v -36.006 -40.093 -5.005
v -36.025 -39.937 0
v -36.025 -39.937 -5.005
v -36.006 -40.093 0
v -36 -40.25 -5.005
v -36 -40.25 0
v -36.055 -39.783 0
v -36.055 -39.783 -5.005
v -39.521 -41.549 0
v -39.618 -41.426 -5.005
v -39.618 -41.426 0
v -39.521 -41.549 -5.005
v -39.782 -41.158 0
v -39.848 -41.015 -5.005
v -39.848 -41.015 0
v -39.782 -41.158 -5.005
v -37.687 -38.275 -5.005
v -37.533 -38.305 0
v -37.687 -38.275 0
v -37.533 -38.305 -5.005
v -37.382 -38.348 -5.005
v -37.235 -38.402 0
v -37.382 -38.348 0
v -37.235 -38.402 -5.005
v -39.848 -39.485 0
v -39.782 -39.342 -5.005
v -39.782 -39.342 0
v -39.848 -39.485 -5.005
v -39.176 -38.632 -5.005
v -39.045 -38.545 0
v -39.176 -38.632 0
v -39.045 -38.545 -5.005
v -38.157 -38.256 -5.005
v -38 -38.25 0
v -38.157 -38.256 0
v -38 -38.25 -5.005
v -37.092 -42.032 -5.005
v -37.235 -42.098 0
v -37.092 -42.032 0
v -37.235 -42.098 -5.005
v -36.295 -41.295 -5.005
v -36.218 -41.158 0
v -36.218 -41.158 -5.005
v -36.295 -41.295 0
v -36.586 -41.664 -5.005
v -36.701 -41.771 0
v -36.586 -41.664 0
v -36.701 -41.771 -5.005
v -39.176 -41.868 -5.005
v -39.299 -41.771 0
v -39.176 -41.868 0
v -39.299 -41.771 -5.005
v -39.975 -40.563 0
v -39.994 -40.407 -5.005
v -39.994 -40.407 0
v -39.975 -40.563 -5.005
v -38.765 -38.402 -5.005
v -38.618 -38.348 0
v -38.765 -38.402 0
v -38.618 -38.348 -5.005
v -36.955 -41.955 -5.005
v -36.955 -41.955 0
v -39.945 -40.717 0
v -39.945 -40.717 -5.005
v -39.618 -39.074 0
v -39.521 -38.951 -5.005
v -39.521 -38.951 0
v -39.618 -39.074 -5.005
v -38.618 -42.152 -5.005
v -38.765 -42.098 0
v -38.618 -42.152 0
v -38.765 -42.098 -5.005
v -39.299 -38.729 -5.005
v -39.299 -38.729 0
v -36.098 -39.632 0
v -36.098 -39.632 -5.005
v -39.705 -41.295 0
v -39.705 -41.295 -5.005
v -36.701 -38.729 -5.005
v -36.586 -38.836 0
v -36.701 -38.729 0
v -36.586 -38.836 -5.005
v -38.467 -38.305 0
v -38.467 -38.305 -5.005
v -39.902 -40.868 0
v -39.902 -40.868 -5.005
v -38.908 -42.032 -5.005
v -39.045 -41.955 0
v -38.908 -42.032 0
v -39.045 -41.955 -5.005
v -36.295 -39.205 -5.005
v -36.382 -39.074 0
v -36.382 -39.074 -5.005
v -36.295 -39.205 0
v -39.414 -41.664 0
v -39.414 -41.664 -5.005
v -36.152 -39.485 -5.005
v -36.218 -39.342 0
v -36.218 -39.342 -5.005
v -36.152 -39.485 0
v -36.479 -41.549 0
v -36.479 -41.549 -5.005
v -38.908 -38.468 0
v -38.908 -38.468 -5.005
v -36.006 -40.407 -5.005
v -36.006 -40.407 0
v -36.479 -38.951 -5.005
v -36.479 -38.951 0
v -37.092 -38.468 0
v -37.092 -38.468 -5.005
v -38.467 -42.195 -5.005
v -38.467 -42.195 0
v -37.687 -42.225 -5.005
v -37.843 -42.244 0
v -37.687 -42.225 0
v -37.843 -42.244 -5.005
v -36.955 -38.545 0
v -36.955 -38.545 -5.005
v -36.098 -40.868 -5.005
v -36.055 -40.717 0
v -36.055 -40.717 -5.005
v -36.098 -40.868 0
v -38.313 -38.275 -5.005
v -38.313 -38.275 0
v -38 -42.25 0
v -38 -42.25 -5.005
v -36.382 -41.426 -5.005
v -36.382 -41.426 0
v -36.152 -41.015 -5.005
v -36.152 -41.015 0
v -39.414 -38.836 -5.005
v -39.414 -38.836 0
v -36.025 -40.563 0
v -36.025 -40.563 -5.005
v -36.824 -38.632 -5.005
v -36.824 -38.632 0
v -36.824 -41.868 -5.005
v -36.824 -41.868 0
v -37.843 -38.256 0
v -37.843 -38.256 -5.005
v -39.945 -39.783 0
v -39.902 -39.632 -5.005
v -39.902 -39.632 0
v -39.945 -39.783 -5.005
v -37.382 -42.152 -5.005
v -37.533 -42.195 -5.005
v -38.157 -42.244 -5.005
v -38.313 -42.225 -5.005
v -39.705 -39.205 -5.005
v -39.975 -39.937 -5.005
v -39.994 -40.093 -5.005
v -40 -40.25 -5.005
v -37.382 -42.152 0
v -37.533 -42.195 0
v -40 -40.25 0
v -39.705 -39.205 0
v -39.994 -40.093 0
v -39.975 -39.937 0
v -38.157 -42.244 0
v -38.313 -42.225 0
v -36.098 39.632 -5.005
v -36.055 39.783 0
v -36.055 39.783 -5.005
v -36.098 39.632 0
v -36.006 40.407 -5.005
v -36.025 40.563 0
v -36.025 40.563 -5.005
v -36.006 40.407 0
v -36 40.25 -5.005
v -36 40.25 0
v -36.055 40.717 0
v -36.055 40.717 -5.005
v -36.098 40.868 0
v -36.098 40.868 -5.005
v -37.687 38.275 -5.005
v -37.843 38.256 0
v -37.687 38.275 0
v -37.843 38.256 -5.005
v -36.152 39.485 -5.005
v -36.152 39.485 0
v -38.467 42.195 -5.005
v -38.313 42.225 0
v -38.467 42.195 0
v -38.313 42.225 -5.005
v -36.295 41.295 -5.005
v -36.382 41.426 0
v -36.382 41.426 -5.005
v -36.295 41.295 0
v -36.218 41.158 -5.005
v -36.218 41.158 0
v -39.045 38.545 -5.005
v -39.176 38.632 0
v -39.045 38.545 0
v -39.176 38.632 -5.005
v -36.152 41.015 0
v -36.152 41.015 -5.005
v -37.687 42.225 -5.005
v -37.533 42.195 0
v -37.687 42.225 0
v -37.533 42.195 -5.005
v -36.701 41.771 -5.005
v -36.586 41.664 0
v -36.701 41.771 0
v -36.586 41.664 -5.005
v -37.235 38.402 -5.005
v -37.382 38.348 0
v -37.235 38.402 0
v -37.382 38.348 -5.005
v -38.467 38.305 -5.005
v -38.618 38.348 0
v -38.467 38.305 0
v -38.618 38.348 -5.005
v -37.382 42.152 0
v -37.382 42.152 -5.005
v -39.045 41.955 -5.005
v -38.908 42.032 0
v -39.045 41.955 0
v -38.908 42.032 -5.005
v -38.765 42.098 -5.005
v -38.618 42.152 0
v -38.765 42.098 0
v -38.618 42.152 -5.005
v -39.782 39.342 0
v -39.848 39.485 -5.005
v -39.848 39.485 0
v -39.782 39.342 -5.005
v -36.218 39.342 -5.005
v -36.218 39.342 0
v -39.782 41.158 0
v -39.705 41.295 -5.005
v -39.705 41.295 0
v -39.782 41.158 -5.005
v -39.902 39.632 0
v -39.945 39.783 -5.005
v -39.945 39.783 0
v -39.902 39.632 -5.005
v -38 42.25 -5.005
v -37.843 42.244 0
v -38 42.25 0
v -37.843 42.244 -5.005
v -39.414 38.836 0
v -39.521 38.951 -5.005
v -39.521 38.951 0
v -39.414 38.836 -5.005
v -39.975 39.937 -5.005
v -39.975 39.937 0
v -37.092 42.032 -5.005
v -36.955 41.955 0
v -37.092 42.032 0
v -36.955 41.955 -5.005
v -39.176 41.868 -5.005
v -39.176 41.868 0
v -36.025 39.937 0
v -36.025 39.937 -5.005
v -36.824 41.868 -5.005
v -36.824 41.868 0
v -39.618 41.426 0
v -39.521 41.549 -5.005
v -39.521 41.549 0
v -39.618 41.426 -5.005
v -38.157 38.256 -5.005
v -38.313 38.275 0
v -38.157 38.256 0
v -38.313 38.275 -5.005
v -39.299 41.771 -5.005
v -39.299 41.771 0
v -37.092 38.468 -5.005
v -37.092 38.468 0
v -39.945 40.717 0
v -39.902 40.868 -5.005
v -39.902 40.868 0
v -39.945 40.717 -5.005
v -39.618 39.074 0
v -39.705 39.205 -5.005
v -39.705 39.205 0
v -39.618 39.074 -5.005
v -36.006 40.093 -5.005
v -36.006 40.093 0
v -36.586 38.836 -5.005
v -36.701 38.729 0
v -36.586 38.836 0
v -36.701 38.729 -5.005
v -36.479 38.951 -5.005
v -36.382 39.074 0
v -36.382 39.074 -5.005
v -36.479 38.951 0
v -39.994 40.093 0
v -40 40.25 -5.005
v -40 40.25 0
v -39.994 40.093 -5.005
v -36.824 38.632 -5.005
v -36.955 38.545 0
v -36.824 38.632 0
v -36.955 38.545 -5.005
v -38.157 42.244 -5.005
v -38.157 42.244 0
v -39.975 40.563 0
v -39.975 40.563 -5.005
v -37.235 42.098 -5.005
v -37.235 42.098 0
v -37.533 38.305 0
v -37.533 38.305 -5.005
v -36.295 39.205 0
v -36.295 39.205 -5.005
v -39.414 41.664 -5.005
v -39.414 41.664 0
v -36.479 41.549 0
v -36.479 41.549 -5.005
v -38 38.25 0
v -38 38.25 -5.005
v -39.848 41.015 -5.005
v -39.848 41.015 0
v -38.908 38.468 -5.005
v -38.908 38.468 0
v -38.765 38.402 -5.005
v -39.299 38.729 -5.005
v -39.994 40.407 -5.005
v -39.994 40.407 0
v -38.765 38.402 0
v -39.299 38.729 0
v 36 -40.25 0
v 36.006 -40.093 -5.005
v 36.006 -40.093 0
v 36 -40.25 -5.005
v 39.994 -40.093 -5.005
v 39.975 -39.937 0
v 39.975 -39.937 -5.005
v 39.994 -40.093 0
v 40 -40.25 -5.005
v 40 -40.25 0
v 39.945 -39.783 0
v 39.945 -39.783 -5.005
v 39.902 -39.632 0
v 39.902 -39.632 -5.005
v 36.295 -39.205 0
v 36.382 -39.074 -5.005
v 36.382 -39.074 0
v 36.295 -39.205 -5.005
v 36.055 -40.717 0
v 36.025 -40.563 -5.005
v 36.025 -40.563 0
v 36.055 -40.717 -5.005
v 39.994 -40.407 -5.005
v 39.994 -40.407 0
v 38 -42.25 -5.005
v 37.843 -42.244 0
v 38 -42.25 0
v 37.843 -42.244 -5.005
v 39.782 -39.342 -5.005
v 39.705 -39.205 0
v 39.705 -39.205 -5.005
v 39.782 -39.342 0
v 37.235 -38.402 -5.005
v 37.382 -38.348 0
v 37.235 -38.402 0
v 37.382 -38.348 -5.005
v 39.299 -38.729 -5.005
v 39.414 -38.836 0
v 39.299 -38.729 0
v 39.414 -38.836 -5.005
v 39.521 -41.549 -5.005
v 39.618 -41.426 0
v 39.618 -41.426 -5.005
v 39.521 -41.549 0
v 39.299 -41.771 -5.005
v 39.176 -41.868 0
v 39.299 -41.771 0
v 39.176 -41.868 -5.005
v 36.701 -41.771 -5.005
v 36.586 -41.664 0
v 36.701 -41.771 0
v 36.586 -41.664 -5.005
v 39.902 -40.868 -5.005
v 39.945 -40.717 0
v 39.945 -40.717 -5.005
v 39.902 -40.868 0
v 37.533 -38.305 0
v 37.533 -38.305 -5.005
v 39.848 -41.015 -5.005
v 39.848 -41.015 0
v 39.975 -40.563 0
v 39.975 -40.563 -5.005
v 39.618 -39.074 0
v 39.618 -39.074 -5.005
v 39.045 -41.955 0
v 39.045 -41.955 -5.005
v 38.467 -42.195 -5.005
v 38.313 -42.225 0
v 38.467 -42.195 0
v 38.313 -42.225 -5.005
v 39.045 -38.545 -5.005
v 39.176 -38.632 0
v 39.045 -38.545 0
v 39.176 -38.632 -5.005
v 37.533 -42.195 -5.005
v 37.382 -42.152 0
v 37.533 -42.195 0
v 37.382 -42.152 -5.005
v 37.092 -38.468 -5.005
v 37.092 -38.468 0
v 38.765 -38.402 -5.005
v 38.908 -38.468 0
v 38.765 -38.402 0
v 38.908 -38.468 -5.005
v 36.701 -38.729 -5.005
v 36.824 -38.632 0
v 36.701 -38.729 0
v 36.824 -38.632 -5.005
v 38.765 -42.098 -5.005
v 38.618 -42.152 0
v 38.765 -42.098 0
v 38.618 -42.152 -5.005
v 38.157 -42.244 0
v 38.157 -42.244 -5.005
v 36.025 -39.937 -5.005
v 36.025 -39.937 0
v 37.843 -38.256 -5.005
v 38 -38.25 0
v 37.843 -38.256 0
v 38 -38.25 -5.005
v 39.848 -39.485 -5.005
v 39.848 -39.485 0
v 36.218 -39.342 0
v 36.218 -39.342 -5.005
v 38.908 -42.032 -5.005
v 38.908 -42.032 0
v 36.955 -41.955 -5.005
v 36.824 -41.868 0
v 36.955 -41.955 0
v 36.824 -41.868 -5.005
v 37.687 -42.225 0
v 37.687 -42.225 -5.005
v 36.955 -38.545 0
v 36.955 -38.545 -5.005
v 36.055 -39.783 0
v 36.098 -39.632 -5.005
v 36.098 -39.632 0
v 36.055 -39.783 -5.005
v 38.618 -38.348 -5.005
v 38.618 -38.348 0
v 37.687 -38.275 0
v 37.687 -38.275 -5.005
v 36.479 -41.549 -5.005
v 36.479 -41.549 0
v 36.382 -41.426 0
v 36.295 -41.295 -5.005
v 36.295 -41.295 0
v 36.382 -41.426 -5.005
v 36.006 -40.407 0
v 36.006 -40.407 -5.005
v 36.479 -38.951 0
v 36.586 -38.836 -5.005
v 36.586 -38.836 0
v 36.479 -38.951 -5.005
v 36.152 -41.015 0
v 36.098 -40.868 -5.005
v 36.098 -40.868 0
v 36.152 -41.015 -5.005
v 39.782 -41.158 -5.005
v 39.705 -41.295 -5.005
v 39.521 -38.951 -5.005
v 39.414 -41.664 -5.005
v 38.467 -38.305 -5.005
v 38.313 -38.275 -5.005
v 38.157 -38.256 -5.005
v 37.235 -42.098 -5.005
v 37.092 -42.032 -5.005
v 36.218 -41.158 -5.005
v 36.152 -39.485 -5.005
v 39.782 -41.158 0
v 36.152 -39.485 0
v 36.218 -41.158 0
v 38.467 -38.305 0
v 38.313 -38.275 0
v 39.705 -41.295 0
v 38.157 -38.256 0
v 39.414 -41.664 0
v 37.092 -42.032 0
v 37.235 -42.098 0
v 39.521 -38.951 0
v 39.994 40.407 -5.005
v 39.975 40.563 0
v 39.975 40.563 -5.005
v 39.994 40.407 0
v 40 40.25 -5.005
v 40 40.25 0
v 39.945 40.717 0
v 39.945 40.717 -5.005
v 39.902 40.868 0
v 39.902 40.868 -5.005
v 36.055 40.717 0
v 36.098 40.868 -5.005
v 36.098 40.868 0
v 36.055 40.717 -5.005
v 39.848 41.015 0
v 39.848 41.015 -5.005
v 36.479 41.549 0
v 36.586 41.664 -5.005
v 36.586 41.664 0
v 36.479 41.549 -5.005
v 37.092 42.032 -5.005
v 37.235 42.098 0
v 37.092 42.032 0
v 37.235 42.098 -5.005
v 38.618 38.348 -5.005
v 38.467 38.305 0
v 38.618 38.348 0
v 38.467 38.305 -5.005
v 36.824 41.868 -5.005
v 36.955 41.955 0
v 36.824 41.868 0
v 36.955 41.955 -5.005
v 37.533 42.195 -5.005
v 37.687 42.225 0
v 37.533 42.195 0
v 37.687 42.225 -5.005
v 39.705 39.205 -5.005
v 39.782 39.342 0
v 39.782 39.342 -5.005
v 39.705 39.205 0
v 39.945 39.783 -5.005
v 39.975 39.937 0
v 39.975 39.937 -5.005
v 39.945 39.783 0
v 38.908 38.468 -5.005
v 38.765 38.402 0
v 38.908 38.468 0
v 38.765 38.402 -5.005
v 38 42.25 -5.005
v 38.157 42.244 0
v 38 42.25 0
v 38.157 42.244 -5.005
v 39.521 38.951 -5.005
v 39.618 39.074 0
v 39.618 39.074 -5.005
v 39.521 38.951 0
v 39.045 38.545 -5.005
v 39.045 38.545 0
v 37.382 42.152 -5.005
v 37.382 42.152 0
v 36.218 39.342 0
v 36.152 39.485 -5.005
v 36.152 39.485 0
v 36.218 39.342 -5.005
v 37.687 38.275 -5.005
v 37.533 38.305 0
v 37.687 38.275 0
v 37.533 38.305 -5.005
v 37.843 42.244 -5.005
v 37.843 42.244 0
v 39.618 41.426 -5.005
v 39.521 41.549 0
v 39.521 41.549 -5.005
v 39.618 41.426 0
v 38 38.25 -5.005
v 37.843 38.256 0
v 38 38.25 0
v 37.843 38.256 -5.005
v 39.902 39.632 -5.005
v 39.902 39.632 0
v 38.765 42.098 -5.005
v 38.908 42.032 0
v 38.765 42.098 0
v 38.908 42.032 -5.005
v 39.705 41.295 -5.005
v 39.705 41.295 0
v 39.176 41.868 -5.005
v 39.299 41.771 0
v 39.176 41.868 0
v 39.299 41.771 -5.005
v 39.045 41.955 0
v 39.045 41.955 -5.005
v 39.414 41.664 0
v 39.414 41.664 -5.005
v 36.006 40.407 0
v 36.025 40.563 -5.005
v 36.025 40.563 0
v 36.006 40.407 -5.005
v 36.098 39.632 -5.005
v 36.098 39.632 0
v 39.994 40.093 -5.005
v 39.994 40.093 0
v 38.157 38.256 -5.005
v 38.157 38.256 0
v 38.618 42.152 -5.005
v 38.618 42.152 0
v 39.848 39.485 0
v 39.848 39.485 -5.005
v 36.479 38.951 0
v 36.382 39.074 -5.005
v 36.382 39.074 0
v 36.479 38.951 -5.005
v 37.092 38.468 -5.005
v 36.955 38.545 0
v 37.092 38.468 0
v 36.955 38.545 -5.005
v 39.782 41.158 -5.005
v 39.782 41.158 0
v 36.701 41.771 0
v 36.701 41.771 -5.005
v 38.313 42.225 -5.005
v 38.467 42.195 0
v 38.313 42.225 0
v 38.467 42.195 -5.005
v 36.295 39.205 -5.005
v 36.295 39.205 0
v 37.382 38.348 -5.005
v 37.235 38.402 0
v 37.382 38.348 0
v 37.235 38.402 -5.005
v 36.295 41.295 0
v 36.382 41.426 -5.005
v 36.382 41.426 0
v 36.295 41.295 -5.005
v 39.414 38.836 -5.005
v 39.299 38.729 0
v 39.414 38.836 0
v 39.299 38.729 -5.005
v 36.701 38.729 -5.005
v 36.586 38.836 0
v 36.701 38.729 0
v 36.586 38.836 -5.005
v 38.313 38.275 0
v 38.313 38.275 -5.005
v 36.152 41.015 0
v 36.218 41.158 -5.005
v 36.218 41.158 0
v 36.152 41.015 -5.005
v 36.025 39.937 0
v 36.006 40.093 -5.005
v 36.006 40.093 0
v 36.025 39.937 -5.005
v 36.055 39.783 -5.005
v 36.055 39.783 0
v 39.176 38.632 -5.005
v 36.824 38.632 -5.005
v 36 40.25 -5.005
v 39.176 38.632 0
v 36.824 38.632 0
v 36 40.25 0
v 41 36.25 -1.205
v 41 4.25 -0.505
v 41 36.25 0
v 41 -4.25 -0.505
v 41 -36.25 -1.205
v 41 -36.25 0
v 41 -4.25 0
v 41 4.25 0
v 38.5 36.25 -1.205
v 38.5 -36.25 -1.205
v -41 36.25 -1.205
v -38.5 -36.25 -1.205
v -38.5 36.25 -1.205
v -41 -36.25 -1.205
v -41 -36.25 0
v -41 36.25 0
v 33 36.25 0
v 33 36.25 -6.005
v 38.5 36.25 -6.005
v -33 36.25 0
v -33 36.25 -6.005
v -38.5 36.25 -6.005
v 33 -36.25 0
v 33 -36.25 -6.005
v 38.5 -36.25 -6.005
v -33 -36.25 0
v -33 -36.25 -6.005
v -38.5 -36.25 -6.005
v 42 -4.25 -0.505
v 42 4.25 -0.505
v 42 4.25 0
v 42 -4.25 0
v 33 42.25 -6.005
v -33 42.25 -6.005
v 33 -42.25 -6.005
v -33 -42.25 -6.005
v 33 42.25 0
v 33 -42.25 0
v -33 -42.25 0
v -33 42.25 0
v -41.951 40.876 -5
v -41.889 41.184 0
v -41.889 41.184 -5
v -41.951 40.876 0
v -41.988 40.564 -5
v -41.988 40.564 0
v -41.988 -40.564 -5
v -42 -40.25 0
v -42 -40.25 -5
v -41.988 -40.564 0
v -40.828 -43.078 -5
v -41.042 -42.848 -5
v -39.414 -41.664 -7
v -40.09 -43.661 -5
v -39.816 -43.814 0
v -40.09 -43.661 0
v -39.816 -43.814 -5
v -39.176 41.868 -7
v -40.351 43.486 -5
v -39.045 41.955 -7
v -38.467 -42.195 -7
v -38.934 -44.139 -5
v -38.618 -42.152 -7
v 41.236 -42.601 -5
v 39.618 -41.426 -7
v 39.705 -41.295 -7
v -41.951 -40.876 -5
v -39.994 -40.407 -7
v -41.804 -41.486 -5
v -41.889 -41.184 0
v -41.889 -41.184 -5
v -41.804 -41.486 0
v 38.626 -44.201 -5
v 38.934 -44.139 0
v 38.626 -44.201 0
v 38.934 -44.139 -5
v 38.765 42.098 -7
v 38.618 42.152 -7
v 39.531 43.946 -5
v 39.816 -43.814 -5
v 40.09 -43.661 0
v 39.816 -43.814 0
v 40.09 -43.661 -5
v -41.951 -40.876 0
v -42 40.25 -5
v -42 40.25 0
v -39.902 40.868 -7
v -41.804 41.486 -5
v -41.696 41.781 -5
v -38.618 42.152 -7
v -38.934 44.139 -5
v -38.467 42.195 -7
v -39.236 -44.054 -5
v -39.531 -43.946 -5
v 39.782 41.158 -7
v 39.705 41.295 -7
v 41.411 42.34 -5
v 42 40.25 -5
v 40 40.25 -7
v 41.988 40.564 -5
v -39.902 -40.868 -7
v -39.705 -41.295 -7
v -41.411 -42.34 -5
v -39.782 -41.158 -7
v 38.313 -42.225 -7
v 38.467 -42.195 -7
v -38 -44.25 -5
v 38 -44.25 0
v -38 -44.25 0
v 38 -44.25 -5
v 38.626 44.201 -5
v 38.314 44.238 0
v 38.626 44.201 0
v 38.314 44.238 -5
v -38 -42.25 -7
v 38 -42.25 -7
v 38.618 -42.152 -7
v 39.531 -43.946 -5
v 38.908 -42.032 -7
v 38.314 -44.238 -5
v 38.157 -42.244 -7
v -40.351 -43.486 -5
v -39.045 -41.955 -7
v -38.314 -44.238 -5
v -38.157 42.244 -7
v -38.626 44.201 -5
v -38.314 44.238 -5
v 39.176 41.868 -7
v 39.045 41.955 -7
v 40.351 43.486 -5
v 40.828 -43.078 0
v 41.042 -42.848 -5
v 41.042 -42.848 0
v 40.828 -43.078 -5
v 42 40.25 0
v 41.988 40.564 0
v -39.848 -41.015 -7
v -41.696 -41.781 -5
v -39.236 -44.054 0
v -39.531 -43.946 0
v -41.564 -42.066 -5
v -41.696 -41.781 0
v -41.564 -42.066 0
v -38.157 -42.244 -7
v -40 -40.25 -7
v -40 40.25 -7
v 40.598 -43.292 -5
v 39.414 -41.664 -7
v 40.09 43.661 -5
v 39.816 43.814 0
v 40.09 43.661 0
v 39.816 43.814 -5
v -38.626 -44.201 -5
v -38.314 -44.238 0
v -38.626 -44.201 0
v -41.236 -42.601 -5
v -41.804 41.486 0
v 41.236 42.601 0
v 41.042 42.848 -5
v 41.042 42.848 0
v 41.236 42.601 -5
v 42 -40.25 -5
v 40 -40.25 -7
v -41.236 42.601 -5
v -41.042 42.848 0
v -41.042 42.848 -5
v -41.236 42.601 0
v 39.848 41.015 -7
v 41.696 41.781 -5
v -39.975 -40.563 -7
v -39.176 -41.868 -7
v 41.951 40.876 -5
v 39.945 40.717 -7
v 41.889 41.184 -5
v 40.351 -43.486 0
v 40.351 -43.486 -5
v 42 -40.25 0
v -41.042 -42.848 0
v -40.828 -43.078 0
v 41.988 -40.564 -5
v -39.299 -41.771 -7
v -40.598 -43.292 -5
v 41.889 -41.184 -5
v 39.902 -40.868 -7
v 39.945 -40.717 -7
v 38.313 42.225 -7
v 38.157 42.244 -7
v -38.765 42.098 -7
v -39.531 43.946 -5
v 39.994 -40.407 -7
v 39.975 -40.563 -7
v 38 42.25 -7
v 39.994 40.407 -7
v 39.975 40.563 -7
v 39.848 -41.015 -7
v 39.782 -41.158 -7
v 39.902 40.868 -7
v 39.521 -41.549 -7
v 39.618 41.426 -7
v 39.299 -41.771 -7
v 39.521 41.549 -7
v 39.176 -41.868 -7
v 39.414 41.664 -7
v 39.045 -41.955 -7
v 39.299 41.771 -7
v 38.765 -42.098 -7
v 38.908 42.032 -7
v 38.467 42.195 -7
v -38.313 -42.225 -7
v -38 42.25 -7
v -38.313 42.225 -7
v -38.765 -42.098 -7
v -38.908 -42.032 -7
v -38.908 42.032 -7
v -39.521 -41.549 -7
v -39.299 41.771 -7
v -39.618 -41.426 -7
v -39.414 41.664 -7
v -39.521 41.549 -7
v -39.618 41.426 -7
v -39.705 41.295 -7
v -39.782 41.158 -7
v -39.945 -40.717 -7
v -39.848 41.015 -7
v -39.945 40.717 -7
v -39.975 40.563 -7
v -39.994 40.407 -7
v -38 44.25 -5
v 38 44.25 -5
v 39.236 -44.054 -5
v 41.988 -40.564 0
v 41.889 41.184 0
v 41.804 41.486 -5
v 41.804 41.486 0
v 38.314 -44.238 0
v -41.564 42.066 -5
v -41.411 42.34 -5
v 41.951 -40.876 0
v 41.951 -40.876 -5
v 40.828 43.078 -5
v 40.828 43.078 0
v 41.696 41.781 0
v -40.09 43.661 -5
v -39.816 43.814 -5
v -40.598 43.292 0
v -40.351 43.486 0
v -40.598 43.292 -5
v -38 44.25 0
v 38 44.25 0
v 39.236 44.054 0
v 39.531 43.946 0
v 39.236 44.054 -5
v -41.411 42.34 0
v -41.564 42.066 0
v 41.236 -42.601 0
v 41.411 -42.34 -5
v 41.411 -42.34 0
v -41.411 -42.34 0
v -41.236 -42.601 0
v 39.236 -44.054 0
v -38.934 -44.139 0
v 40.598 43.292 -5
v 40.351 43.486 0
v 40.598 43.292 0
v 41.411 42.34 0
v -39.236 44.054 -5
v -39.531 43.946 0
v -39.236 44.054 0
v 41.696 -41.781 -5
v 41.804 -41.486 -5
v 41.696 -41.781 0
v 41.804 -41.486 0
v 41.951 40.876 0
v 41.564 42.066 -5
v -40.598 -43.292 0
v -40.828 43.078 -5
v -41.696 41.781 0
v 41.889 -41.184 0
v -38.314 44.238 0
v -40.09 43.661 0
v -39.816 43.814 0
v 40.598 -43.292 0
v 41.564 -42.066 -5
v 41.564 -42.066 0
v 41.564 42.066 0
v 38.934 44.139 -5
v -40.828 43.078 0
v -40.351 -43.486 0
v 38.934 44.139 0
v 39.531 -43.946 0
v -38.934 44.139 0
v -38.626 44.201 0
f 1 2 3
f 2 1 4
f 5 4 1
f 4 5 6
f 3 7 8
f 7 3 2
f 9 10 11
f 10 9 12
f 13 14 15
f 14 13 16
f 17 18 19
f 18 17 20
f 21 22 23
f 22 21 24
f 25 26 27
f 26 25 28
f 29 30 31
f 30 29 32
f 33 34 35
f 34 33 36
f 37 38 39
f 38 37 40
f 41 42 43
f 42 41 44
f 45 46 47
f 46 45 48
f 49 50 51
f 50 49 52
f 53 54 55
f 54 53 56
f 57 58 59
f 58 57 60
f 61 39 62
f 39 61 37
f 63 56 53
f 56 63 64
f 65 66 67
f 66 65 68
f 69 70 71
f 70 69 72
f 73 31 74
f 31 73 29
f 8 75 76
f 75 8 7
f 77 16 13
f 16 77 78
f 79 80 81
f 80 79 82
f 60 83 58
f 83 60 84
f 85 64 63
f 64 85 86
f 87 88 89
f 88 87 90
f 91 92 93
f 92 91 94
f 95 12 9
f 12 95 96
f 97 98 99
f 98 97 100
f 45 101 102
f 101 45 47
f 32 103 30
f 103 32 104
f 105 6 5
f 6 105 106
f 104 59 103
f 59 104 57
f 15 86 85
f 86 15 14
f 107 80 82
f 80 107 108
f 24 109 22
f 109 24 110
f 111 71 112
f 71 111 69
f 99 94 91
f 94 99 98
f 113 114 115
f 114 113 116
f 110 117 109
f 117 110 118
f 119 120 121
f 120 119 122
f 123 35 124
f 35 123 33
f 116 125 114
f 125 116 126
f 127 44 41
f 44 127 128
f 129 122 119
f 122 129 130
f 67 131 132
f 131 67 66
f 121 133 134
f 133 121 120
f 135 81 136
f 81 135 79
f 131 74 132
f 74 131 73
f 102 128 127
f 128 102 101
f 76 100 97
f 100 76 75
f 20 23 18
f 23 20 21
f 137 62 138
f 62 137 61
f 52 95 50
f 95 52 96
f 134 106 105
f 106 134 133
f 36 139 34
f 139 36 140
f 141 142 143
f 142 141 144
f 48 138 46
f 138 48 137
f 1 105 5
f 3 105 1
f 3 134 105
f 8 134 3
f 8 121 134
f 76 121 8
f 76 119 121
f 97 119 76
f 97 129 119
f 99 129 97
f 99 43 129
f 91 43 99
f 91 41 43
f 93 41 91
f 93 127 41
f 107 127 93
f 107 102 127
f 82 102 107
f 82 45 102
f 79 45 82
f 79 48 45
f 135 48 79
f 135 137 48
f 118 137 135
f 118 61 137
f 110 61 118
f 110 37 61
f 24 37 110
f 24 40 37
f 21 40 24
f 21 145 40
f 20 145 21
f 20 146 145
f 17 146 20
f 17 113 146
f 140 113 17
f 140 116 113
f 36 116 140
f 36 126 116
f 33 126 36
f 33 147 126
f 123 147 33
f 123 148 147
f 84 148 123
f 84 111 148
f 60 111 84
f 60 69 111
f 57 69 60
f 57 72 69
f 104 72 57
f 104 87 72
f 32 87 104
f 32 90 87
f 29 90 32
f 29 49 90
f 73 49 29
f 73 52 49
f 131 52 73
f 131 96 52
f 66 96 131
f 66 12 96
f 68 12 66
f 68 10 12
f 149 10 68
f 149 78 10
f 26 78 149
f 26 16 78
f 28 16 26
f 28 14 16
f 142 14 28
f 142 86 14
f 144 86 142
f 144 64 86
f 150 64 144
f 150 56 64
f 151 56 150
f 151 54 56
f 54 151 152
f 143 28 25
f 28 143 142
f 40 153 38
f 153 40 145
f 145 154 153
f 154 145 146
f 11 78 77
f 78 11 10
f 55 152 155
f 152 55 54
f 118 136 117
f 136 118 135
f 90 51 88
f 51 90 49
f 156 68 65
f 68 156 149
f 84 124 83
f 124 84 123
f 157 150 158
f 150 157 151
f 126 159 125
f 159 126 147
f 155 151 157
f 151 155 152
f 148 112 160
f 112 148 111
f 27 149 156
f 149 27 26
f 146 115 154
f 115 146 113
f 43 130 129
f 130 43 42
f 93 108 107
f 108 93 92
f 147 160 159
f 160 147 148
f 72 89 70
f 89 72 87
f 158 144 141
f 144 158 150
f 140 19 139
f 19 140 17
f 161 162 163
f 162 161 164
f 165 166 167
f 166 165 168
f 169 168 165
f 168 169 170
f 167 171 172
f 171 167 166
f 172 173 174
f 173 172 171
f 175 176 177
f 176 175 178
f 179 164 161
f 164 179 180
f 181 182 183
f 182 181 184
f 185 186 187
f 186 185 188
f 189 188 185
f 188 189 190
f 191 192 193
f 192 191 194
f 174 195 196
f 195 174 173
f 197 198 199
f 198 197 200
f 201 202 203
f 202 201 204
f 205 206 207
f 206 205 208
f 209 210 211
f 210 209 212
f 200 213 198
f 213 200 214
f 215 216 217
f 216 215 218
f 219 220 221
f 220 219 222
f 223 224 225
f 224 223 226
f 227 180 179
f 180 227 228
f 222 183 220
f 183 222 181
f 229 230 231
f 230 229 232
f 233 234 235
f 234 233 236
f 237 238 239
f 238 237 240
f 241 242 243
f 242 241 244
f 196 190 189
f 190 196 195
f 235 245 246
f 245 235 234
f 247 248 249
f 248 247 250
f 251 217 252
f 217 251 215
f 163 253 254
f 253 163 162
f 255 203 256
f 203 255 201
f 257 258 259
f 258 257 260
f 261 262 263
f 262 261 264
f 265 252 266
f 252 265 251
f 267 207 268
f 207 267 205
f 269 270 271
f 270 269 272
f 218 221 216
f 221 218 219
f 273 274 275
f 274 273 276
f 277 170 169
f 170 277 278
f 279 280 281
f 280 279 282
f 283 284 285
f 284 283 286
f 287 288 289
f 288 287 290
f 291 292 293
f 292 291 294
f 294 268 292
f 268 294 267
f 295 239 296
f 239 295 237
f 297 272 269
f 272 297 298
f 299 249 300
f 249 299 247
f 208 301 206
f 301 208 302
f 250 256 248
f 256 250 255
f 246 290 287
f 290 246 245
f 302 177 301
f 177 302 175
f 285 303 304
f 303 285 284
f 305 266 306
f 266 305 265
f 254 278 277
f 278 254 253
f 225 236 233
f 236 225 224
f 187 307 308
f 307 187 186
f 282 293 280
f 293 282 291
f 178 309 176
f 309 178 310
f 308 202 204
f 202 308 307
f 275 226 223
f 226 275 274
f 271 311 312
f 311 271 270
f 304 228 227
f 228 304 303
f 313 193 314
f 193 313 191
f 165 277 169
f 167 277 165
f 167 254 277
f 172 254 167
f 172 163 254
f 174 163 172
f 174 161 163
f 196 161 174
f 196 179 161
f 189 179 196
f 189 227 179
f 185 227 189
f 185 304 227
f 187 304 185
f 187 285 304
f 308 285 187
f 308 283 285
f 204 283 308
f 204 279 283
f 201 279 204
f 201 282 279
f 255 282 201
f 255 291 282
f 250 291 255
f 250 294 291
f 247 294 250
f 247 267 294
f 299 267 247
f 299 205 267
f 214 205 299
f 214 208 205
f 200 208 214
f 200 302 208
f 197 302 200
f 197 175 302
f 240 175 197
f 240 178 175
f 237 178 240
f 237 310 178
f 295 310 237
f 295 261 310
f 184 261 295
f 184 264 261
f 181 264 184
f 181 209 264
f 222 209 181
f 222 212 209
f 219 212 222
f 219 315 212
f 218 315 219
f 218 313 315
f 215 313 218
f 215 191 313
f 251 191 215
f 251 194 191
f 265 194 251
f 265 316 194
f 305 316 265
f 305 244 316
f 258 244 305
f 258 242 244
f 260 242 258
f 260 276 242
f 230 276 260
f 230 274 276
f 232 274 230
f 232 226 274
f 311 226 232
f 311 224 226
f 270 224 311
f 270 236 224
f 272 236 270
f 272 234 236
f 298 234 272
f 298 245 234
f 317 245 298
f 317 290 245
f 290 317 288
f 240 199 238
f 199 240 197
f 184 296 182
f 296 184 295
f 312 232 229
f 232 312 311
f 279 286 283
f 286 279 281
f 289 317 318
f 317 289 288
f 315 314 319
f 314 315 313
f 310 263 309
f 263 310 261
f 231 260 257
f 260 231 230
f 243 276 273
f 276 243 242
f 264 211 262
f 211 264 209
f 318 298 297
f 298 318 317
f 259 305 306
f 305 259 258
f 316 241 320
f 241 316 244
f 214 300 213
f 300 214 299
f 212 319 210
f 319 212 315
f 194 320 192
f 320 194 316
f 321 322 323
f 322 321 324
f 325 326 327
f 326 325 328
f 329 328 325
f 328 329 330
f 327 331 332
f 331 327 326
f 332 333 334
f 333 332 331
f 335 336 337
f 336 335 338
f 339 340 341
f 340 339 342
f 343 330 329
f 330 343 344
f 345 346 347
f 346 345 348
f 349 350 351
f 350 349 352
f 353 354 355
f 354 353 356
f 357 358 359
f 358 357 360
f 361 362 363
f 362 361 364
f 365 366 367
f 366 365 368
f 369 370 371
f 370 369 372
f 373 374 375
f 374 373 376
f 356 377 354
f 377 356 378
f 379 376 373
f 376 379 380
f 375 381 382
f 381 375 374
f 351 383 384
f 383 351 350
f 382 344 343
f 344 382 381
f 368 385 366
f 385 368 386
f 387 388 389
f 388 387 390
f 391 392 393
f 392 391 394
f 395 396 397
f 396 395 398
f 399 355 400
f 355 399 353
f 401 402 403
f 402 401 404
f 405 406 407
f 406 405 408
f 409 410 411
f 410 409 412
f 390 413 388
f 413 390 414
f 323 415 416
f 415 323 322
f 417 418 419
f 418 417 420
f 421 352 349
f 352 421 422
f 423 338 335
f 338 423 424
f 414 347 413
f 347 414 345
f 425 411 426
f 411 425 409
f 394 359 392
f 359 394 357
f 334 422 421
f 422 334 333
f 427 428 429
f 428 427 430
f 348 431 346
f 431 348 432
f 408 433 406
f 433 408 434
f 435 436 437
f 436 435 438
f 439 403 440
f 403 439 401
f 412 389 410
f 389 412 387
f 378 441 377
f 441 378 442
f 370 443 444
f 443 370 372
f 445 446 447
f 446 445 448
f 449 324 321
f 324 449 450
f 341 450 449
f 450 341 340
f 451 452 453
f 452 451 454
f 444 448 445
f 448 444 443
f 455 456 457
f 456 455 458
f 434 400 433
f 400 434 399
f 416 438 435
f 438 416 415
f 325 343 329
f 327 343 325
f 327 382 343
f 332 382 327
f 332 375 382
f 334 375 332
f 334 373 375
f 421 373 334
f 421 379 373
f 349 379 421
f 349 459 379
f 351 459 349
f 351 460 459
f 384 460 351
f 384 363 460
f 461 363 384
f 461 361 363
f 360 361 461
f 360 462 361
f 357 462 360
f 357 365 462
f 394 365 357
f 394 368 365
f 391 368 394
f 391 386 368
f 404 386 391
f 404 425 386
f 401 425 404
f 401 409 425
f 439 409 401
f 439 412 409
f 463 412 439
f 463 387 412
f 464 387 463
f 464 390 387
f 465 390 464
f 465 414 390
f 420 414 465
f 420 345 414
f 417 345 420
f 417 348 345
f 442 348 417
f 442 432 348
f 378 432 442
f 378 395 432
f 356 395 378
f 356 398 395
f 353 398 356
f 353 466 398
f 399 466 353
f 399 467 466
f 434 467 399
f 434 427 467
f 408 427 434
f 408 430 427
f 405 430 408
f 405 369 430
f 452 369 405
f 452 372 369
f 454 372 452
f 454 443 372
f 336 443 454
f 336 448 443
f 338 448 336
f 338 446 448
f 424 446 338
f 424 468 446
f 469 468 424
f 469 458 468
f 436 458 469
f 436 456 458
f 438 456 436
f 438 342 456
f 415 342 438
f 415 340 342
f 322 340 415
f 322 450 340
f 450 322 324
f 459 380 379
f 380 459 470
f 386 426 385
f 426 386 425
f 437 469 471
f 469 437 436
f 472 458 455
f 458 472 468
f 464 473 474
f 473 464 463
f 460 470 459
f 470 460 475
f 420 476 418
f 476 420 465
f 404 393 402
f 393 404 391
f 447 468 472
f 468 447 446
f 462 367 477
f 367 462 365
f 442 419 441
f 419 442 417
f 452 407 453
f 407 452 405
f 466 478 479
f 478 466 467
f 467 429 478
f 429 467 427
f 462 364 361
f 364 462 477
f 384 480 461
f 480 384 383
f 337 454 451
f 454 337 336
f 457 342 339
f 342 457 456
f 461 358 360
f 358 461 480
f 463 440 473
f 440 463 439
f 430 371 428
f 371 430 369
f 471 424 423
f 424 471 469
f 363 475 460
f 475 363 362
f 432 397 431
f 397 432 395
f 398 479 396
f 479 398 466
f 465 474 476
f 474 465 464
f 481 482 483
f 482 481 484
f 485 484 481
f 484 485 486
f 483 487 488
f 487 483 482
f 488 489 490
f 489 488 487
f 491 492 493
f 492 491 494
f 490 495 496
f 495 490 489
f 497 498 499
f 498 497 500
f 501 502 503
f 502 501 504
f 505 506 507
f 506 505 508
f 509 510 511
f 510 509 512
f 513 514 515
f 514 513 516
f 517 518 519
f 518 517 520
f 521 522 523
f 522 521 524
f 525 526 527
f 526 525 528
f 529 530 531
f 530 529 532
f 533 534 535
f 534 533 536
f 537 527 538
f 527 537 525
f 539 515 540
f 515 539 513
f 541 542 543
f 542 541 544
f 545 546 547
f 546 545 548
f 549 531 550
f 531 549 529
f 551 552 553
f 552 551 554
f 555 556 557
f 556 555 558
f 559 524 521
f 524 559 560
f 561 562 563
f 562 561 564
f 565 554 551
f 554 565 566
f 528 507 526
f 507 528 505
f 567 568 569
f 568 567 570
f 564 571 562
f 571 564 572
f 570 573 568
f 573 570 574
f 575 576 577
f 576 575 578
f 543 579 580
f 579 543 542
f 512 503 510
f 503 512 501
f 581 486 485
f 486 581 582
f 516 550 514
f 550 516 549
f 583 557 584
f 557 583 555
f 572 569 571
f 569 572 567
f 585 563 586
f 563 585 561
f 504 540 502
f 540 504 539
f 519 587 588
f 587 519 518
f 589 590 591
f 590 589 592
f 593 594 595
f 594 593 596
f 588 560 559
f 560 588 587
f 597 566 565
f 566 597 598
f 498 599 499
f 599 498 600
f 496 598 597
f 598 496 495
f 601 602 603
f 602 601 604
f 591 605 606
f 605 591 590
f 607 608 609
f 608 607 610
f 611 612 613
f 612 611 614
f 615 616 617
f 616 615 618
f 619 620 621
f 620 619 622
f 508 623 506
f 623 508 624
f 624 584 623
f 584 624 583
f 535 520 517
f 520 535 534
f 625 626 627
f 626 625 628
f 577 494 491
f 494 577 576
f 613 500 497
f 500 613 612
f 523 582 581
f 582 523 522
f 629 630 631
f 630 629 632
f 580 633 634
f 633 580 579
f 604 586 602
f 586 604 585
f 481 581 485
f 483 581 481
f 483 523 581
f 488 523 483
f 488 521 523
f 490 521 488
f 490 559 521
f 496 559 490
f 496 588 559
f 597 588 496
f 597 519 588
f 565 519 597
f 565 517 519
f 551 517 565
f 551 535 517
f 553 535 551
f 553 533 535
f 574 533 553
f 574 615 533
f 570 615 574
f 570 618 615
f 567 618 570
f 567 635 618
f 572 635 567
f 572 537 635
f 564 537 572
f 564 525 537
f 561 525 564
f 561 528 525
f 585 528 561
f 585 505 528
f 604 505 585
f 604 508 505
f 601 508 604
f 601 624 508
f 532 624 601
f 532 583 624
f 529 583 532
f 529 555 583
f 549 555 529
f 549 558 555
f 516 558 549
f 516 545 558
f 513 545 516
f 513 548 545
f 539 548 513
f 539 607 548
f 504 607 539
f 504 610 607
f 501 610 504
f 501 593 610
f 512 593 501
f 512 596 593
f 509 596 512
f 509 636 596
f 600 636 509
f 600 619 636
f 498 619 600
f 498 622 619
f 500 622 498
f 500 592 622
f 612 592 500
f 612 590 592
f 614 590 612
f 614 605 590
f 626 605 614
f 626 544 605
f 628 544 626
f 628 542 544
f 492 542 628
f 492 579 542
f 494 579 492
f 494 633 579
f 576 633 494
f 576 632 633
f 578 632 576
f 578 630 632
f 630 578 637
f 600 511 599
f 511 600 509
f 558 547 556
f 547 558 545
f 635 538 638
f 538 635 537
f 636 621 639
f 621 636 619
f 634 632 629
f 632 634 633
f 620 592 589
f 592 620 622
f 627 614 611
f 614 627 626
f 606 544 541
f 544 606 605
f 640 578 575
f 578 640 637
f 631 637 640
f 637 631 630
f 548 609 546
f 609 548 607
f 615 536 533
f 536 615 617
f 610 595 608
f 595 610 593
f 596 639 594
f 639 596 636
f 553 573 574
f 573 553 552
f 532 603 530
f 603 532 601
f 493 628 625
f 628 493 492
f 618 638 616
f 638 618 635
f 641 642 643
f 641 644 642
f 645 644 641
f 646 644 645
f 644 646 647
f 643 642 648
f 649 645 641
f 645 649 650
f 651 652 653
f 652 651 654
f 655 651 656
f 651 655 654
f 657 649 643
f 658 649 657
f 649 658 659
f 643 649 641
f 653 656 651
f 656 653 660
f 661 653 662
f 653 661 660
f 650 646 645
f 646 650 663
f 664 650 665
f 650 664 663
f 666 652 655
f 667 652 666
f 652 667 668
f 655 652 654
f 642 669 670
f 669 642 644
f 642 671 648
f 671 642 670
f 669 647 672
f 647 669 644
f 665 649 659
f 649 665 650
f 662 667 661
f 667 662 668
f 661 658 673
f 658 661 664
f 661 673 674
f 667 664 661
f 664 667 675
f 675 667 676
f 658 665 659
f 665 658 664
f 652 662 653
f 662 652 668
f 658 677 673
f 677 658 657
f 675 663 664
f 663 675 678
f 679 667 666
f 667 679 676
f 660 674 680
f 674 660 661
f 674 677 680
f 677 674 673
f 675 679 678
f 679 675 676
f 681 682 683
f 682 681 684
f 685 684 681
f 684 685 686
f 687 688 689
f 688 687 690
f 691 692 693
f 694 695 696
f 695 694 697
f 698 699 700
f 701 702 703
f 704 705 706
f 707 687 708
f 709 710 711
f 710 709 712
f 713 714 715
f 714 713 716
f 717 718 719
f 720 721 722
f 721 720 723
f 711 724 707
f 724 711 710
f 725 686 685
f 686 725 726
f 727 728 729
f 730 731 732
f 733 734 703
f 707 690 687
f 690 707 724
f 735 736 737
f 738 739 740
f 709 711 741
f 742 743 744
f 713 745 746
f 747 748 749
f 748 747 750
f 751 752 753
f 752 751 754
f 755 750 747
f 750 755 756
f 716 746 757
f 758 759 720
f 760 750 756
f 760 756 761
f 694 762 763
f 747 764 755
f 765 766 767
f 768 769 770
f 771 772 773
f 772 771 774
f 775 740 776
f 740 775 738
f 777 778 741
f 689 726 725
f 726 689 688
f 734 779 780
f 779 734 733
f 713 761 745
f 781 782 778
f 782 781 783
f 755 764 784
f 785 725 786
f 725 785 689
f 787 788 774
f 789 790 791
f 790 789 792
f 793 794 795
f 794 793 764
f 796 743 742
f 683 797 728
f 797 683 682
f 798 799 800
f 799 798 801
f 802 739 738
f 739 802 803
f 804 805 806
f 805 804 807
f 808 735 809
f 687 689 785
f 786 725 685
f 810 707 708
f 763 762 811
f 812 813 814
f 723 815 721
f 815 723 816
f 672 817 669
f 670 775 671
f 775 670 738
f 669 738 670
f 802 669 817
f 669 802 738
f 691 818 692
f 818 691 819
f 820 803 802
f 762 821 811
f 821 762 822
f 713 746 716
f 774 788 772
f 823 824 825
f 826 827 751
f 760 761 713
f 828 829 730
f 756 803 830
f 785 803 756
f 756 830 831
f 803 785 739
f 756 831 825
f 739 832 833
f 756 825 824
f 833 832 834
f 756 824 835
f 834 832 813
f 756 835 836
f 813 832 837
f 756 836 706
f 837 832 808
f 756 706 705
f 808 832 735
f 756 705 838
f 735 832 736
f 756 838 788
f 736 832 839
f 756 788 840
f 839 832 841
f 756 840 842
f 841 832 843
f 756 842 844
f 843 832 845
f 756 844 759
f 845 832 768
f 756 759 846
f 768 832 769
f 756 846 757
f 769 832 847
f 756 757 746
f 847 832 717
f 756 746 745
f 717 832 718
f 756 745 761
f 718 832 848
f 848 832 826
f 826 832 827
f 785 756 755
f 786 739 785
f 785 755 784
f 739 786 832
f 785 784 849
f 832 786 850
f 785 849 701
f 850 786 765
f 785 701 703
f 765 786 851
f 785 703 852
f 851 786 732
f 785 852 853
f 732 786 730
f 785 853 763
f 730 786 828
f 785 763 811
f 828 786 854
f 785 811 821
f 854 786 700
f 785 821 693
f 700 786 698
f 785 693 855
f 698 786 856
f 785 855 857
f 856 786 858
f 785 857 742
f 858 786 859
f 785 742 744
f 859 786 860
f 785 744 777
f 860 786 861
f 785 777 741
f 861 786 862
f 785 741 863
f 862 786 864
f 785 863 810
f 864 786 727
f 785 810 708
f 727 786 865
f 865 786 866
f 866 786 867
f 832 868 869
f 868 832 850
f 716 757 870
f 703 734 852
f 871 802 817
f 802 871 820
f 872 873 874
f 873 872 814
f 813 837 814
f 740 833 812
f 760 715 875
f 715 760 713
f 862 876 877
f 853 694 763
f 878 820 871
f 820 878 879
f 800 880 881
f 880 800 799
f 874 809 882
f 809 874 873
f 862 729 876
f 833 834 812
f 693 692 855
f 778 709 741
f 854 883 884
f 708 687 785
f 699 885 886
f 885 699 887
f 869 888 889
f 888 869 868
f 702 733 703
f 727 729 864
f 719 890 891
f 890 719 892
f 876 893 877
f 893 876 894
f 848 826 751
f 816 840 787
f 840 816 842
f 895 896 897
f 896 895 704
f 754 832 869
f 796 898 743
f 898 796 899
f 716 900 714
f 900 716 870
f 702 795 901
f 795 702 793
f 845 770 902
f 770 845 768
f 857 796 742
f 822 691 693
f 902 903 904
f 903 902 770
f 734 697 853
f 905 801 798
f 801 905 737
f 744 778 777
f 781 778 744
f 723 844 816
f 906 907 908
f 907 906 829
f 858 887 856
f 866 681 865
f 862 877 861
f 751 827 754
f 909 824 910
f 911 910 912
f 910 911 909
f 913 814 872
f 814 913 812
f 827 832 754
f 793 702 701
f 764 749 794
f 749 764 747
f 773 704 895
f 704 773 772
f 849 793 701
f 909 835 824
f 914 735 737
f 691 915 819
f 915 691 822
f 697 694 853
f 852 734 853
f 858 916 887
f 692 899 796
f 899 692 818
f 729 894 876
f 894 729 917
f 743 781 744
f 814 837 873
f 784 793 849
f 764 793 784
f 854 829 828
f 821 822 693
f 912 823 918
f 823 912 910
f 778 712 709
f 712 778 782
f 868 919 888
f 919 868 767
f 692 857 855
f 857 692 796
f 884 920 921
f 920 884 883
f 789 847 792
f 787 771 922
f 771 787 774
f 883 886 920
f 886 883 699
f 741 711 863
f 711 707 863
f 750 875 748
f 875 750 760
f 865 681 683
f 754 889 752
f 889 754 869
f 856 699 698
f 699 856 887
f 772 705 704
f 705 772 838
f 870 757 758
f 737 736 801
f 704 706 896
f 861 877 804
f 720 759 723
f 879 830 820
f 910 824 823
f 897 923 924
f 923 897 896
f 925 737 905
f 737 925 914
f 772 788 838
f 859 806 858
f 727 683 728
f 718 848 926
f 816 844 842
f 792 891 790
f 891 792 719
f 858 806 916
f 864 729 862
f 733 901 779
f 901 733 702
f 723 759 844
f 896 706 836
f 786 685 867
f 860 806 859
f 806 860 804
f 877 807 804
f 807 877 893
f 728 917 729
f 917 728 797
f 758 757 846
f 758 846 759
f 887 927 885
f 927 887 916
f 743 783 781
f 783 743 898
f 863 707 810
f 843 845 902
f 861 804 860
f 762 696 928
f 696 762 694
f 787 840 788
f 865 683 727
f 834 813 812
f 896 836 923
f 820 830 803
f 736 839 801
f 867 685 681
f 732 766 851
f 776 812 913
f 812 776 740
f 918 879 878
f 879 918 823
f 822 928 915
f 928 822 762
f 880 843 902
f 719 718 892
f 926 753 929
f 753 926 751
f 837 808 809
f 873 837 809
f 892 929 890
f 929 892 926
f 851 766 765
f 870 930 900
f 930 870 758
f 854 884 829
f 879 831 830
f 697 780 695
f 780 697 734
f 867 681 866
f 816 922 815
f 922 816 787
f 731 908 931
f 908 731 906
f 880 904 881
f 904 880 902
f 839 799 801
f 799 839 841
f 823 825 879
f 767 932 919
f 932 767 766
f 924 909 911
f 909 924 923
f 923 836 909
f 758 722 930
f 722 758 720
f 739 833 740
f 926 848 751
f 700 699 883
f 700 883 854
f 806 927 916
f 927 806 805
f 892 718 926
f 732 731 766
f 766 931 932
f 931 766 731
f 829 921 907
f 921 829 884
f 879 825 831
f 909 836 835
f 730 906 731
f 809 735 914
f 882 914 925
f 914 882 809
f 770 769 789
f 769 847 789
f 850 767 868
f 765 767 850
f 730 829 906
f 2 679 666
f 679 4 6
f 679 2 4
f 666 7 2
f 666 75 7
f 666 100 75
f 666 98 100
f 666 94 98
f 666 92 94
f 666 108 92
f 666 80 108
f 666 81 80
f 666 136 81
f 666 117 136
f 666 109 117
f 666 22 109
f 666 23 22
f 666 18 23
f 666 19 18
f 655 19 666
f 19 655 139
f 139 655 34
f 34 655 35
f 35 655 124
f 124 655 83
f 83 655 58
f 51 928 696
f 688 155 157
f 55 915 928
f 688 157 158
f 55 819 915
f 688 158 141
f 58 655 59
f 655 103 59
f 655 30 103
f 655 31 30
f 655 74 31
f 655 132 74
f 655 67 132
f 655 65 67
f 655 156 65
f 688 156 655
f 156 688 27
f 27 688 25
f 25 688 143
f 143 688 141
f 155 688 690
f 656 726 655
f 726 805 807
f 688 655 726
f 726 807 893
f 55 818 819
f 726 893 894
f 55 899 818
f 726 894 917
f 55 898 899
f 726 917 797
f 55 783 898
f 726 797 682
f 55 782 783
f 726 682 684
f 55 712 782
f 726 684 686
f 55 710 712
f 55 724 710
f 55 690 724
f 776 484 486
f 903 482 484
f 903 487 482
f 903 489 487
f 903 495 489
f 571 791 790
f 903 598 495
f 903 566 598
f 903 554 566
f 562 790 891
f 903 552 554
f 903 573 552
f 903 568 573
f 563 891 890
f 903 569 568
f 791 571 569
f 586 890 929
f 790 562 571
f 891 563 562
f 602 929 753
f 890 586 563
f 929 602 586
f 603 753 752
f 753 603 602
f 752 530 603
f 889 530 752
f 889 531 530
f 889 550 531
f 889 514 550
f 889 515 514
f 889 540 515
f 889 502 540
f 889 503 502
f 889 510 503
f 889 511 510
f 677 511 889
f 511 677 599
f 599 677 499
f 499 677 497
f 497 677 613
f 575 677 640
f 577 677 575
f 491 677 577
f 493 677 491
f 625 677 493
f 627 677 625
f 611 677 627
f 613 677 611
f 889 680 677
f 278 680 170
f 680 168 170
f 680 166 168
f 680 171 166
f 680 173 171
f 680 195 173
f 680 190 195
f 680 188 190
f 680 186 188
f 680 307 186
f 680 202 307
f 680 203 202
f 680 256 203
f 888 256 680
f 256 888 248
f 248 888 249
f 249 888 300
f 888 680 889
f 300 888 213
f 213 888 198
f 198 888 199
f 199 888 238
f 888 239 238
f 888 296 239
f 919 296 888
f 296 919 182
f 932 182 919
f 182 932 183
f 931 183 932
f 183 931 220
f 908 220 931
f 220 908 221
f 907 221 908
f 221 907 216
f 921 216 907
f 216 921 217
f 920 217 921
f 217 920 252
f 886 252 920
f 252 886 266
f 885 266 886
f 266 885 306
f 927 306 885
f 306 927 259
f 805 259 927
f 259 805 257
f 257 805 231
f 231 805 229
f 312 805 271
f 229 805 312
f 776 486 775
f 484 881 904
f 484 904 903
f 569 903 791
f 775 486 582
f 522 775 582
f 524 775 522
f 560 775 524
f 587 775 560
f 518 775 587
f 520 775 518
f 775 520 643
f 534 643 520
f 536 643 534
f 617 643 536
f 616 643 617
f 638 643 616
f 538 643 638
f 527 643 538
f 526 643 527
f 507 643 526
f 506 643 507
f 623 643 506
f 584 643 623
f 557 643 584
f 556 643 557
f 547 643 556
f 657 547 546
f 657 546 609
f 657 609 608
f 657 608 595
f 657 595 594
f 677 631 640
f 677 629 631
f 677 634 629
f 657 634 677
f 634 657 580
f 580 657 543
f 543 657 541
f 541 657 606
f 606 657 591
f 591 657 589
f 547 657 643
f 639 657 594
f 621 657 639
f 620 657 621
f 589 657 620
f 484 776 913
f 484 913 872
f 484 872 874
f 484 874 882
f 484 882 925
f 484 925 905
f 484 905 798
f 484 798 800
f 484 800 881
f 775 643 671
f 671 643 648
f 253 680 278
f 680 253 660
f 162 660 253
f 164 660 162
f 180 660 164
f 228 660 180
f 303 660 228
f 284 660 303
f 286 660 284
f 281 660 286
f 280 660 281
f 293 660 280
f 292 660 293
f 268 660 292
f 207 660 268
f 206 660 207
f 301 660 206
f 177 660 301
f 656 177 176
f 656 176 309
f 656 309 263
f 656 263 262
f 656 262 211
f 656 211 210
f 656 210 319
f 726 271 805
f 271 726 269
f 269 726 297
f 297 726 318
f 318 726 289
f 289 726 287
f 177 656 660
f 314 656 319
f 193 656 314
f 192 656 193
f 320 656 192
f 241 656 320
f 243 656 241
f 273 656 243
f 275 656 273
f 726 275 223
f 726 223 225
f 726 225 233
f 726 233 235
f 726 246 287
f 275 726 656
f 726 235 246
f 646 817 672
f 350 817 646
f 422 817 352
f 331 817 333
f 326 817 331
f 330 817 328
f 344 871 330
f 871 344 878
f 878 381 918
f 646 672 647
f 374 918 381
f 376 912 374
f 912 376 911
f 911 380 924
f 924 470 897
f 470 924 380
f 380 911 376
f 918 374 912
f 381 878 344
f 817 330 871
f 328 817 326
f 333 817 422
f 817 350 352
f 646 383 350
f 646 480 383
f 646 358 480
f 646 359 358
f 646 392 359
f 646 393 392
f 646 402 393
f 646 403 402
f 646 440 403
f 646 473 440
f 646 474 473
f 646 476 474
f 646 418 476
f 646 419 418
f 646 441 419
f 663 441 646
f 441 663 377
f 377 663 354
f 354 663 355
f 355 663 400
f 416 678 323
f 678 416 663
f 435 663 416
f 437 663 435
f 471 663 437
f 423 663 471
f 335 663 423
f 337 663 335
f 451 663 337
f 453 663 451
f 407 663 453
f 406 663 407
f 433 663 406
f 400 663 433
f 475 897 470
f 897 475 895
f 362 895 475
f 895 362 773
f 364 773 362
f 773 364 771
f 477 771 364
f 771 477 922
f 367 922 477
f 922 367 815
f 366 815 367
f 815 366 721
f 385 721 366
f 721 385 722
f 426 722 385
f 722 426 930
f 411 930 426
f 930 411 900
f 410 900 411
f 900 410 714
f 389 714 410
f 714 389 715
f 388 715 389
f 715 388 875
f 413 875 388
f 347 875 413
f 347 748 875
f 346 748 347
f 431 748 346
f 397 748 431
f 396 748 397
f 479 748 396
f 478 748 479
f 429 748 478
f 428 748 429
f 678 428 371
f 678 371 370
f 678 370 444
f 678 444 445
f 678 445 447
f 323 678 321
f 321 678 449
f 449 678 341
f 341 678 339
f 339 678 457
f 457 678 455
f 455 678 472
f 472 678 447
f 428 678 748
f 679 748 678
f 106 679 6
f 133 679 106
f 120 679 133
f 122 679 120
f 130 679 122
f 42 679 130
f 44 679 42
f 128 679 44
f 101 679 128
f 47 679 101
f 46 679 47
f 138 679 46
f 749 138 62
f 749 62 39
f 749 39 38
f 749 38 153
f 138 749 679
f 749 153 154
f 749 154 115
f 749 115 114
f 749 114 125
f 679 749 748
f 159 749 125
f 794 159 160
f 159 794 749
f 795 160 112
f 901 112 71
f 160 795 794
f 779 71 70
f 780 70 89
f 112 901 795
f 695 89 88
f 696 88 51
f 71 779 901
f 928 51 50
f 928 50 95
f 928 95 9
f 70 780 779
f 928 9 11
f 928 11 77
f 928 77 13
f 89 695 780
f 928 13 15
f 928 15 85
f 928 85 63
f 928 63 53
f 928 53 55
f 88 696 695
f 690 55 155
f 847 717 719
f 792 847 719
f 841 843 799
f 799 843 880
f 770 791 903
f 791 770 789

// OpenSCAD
/* 
 * Case for Raspberry Pi Pico with built in cable retainer
 *
 * Design: hxr.social/@thomasflummer
 *
 * License: CC-BY-SA
 *
 */
 
module case_bottom(pcb_length, pcb_width)
{
    difference()
    {
        union()
        {
            hull()
            {
                // main case
                hull()
                {
                    for (x = [-1, 1])
                    {
                        for (y = [-1, 1])
                        {
                            translate([x*((pcb_length+2)/2 - 4), y*((pcb_width+4+12)/2 - 4), 2+5/2])
                                cylinder(h = 5, r = 4, center = true, $fn = 80);
                        }
                    }
                }

                // bottom chamfer
                hull()
                {
                    for (x = [-1, 1])
                    {
                        for (y = [-1, 1])
                        {
                            translate([x*((pcb_length+2)/2 - 4), y*((pcb_width+4+12)/2 - 4), 2/2])
                                cylinder(h = 2, r = 2, center = true, $fn = 80);
                        }
                    }
                }
            }
        }
        union()
        {
            // pcb
            translate([0, 0, 5+2-1.2/2])
                cube([pcb_length, pcb_width, 1.21], center = true);

            // micro USB cutout
            translate([pcb_length/2, 0, 5+2-0.5/2])
                cube([10, 8.5, 0.51], center = true);

            translate([0, 0, 5+2-4/2])
                cube([pcb_length-5, pcb_width, 8.01], center = true);

            translate([0, 0, 5+2-4/2])
                cube([pcb_length-16, pcb_width+12, 8.01], center = true);

            // cutout for inserts
            for (x = [-1, 1])
            {
                for (y = [-1, 1])
                {
                    translate([x*((pcb_length+2)/2 - 4), y*((pcb_width+4+12)/2 - 4), 2+5/2])
                        cylinder(h = 5.01, d = 4, center = true, $fn = 80);
                }
            }        
        }
    }
}

module case_top(pcb_length, pcb_width, height)
{
    difference()
    {
        union()
        {
            hull()
            {
                // main case
                hull()
                {
                    for (x = [-1, 1])
                    {
                        for (y = [-1, 1])
                        {
                            translate([x*((pcb_length+2)/2 - 4), y*((pcb_width+4+12)/2 - 4), height/2])
                                cylinder(h = height, r = 4, center = true, $fn = 80);
                        }
                    }
                }

                // top chamfer
                hull()
                {
                    for (x = [-1, 1])
                    {
                        for (y = [-1, 1])
                        {
                            translate([x*((pcb_length+2)/2 - 4), y*((pcb_width+4+12)/2 - 4), height+2/2])
                                cylinder(h = 2, r = 2, center = true, $fn = 80);
                        }
                    }
                }
            }
        }
        union()
        {
            translate([12/2, 0, (height)/2])
                cube([pcb_length-5-12, pcb_width-2, height+0.01], center = true);

            translate([6/2, 0, (height)/2])
                cube([pcb_length-16-6, pcb_width+12, height+0.01], center = true);

            // micro USB cutout
            translate([pcb_length/2, 0, 2.9/2])
                cube([10, 8.5, 2.91], center = true);
                
            // cable cutout
            translate([-pcb_length/2, 0, 6/2])
            rotate(90, [0, 1, 0])
                cylinder(h = 10, d = 5.5, center = true, $fn = 80);

            translate([-pcb_length/2, 0, 3/2])
                cube([10, 5.5, 3.01], center = true);

            // cable support
            difference()
            {
                translate([0, 0, (height)/2])
                    cube([pcb_length-5, 10, height+0.01], center = true);

                translate([-pcb_length/2+6, -6, (height)/2])
                    cube([2, 10, height+1], center = true);

                translate([-pcb_length/2+13, 6, (height)/2])
                    cube([2, 10, height+1], center = true);
            }
            
            // cutout for screws
            for (x = [-1, 1])
            {
                for (y = [-1, 1])
                {
                    translate([x*((pcb_length+2)/2 - 4), y*((pcb_width+4+12)/2 - 4), height/2])
                        cylinder(h = height+10, d = 3.3, center = true, $fn = 30);

                    translate([x*((pcb_length+2)/2 - 4), y*((pcb_width+4+12)/2 - 4), height+4/2-1.4])
                        cylinder(h = 4, d = 7, center = true, $fn = 60);

                    translate([x*((pcb_length+2)/2 - 4), y*((pcb_width+4+12)/2 - 4 + 7/2), height+4/2-1.4])
                        cube([7, 7, 4], center = true);

                    translate([x*((pcb_length+2)/2 - 4 + 7/2), y*((pcb_width+4+12)/2 - 4), height+4/2-1.4])
                        cube([7, 7, 4], center = true);
                }
            }
                
        }
    }
}


difference()
{
    union()
    {

//        color("#666666")
//        translate([0, 0, 0])
//            case_top(52, 21.5, 7);

        color("#666666")
        translate([0, 0, -2-5])
            case_bottom(82, 72.5);

    }
    union()
    {
        //rotate(30, [0, 0, 1])
        //translate([0, 50, 0])
        //   cube([100, 100, 100], center = true);
    }
}
/*
color("#cccccc")
translate([-51.3/2, 21/2, -1])
rotate(-90, [0, 0, 1])
    import("pico.stl");
*/
